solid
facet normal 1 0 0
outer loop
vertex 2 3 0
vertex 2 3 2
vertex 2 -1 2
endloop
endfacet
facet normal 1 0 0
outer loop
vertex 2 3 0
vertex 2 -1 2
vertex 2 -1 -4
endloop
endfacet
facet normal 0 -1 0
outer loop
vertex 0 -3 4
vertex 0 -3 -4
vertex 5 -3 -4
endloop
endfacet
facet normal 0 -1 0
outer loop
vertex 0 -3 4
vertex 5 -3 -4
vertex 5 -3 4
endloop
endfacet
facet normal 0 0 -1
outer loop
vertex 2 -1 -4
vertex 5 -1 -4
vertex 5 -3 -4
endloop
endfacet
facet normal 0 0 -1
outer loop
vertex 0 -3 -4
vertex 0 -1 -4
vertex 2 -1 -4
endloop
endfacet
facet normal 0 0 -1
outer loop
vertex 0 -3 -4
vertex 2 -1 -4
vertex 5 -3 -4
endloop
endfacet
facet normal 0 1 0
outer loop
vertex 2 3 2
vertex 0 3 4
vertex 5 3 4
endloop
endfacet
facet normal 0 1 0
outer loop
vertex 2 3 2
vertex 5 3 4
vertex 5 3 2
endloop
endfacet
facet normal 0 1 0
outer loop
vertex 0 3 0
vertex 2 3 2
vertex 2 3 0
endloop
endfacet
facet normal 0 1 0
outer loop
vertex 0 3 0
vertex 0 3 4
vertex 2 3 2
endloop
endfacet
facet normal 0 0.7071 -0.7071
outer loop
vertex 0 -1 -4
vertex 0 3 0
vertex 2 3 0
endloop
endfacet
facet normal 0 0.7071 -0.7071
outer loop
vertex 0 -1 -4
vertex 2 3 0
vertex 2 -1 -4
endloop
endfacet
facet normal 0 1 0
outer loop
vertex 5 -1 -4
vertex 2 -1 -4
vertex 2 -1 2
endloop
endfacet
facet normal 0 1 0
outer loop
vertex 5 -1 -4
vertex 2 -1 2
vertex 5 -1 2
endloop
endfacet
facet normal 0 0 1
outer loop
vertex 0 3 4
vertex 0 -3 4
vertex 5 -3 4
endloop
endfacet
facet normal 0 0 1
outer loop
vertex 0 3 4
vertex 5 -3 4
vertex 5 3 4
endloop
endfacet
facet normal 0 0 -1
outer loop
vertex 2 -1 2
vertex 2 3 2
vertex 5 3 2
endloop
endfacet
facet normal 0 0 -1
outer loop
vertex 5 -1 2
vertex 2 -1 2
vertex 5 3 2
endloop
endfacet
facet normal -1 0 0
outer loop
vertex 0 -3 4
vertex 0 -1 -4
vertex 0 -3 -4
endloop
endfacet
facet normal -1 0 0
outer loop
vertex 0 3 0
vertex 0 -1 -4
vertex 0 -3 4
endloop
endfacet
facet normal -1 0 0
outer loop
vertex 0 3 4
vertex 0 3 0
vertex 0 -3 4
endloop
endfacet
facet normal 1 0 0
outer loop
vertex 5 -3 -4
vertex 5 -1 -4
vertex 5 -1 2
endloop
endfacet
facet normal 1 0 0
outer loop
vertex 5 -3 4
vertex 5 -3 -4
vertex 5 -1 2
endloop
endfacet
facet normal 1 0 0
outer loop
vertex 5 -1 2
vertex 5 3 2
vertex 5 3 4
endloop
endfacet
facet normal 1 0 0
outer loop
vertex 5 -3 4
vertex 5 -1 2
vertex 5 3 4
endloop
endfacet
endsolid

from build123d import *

# Parameters (mm, degrees)
SALIENTE_EXTRUIR2_DEPTH = 5
CROQUIS4_W              = 3
CROQUIS4_H              = 6
CORTAR_EXTRUIR1_DEPTH   = 4


with BuildPart() as part:
    # Croquis2 → Saliente-Extruir2 (new body)
    with BuildSketch(Plane(origin=(0, 0, 0), x_dir=(0, 0, -1), z_dir=(1, 0, 0))):
        Polygon((0, 3), (4, -1), (4, -3), (-4, -3), (-4, 3), align=None)
    extrude(amount=SALIENTE_EXTRUIR2_DEPTH)

    # Croquis4 → Cortar-Extruir1 (cut)
    with BuildSketch(Plane(origin=(0, 3, 0), x_dir=(1, 0, 0), z_dir=(0, 1, 0))):
        with Locations((3.5, 1)):
            Rectangle(CROQUIS4_W, CROQUIS4_H)
    extrude(amount=-CORTAR_EXTRUIR1_DEPTH, mode=Mode.SUBTRACT)


solid = part.part
